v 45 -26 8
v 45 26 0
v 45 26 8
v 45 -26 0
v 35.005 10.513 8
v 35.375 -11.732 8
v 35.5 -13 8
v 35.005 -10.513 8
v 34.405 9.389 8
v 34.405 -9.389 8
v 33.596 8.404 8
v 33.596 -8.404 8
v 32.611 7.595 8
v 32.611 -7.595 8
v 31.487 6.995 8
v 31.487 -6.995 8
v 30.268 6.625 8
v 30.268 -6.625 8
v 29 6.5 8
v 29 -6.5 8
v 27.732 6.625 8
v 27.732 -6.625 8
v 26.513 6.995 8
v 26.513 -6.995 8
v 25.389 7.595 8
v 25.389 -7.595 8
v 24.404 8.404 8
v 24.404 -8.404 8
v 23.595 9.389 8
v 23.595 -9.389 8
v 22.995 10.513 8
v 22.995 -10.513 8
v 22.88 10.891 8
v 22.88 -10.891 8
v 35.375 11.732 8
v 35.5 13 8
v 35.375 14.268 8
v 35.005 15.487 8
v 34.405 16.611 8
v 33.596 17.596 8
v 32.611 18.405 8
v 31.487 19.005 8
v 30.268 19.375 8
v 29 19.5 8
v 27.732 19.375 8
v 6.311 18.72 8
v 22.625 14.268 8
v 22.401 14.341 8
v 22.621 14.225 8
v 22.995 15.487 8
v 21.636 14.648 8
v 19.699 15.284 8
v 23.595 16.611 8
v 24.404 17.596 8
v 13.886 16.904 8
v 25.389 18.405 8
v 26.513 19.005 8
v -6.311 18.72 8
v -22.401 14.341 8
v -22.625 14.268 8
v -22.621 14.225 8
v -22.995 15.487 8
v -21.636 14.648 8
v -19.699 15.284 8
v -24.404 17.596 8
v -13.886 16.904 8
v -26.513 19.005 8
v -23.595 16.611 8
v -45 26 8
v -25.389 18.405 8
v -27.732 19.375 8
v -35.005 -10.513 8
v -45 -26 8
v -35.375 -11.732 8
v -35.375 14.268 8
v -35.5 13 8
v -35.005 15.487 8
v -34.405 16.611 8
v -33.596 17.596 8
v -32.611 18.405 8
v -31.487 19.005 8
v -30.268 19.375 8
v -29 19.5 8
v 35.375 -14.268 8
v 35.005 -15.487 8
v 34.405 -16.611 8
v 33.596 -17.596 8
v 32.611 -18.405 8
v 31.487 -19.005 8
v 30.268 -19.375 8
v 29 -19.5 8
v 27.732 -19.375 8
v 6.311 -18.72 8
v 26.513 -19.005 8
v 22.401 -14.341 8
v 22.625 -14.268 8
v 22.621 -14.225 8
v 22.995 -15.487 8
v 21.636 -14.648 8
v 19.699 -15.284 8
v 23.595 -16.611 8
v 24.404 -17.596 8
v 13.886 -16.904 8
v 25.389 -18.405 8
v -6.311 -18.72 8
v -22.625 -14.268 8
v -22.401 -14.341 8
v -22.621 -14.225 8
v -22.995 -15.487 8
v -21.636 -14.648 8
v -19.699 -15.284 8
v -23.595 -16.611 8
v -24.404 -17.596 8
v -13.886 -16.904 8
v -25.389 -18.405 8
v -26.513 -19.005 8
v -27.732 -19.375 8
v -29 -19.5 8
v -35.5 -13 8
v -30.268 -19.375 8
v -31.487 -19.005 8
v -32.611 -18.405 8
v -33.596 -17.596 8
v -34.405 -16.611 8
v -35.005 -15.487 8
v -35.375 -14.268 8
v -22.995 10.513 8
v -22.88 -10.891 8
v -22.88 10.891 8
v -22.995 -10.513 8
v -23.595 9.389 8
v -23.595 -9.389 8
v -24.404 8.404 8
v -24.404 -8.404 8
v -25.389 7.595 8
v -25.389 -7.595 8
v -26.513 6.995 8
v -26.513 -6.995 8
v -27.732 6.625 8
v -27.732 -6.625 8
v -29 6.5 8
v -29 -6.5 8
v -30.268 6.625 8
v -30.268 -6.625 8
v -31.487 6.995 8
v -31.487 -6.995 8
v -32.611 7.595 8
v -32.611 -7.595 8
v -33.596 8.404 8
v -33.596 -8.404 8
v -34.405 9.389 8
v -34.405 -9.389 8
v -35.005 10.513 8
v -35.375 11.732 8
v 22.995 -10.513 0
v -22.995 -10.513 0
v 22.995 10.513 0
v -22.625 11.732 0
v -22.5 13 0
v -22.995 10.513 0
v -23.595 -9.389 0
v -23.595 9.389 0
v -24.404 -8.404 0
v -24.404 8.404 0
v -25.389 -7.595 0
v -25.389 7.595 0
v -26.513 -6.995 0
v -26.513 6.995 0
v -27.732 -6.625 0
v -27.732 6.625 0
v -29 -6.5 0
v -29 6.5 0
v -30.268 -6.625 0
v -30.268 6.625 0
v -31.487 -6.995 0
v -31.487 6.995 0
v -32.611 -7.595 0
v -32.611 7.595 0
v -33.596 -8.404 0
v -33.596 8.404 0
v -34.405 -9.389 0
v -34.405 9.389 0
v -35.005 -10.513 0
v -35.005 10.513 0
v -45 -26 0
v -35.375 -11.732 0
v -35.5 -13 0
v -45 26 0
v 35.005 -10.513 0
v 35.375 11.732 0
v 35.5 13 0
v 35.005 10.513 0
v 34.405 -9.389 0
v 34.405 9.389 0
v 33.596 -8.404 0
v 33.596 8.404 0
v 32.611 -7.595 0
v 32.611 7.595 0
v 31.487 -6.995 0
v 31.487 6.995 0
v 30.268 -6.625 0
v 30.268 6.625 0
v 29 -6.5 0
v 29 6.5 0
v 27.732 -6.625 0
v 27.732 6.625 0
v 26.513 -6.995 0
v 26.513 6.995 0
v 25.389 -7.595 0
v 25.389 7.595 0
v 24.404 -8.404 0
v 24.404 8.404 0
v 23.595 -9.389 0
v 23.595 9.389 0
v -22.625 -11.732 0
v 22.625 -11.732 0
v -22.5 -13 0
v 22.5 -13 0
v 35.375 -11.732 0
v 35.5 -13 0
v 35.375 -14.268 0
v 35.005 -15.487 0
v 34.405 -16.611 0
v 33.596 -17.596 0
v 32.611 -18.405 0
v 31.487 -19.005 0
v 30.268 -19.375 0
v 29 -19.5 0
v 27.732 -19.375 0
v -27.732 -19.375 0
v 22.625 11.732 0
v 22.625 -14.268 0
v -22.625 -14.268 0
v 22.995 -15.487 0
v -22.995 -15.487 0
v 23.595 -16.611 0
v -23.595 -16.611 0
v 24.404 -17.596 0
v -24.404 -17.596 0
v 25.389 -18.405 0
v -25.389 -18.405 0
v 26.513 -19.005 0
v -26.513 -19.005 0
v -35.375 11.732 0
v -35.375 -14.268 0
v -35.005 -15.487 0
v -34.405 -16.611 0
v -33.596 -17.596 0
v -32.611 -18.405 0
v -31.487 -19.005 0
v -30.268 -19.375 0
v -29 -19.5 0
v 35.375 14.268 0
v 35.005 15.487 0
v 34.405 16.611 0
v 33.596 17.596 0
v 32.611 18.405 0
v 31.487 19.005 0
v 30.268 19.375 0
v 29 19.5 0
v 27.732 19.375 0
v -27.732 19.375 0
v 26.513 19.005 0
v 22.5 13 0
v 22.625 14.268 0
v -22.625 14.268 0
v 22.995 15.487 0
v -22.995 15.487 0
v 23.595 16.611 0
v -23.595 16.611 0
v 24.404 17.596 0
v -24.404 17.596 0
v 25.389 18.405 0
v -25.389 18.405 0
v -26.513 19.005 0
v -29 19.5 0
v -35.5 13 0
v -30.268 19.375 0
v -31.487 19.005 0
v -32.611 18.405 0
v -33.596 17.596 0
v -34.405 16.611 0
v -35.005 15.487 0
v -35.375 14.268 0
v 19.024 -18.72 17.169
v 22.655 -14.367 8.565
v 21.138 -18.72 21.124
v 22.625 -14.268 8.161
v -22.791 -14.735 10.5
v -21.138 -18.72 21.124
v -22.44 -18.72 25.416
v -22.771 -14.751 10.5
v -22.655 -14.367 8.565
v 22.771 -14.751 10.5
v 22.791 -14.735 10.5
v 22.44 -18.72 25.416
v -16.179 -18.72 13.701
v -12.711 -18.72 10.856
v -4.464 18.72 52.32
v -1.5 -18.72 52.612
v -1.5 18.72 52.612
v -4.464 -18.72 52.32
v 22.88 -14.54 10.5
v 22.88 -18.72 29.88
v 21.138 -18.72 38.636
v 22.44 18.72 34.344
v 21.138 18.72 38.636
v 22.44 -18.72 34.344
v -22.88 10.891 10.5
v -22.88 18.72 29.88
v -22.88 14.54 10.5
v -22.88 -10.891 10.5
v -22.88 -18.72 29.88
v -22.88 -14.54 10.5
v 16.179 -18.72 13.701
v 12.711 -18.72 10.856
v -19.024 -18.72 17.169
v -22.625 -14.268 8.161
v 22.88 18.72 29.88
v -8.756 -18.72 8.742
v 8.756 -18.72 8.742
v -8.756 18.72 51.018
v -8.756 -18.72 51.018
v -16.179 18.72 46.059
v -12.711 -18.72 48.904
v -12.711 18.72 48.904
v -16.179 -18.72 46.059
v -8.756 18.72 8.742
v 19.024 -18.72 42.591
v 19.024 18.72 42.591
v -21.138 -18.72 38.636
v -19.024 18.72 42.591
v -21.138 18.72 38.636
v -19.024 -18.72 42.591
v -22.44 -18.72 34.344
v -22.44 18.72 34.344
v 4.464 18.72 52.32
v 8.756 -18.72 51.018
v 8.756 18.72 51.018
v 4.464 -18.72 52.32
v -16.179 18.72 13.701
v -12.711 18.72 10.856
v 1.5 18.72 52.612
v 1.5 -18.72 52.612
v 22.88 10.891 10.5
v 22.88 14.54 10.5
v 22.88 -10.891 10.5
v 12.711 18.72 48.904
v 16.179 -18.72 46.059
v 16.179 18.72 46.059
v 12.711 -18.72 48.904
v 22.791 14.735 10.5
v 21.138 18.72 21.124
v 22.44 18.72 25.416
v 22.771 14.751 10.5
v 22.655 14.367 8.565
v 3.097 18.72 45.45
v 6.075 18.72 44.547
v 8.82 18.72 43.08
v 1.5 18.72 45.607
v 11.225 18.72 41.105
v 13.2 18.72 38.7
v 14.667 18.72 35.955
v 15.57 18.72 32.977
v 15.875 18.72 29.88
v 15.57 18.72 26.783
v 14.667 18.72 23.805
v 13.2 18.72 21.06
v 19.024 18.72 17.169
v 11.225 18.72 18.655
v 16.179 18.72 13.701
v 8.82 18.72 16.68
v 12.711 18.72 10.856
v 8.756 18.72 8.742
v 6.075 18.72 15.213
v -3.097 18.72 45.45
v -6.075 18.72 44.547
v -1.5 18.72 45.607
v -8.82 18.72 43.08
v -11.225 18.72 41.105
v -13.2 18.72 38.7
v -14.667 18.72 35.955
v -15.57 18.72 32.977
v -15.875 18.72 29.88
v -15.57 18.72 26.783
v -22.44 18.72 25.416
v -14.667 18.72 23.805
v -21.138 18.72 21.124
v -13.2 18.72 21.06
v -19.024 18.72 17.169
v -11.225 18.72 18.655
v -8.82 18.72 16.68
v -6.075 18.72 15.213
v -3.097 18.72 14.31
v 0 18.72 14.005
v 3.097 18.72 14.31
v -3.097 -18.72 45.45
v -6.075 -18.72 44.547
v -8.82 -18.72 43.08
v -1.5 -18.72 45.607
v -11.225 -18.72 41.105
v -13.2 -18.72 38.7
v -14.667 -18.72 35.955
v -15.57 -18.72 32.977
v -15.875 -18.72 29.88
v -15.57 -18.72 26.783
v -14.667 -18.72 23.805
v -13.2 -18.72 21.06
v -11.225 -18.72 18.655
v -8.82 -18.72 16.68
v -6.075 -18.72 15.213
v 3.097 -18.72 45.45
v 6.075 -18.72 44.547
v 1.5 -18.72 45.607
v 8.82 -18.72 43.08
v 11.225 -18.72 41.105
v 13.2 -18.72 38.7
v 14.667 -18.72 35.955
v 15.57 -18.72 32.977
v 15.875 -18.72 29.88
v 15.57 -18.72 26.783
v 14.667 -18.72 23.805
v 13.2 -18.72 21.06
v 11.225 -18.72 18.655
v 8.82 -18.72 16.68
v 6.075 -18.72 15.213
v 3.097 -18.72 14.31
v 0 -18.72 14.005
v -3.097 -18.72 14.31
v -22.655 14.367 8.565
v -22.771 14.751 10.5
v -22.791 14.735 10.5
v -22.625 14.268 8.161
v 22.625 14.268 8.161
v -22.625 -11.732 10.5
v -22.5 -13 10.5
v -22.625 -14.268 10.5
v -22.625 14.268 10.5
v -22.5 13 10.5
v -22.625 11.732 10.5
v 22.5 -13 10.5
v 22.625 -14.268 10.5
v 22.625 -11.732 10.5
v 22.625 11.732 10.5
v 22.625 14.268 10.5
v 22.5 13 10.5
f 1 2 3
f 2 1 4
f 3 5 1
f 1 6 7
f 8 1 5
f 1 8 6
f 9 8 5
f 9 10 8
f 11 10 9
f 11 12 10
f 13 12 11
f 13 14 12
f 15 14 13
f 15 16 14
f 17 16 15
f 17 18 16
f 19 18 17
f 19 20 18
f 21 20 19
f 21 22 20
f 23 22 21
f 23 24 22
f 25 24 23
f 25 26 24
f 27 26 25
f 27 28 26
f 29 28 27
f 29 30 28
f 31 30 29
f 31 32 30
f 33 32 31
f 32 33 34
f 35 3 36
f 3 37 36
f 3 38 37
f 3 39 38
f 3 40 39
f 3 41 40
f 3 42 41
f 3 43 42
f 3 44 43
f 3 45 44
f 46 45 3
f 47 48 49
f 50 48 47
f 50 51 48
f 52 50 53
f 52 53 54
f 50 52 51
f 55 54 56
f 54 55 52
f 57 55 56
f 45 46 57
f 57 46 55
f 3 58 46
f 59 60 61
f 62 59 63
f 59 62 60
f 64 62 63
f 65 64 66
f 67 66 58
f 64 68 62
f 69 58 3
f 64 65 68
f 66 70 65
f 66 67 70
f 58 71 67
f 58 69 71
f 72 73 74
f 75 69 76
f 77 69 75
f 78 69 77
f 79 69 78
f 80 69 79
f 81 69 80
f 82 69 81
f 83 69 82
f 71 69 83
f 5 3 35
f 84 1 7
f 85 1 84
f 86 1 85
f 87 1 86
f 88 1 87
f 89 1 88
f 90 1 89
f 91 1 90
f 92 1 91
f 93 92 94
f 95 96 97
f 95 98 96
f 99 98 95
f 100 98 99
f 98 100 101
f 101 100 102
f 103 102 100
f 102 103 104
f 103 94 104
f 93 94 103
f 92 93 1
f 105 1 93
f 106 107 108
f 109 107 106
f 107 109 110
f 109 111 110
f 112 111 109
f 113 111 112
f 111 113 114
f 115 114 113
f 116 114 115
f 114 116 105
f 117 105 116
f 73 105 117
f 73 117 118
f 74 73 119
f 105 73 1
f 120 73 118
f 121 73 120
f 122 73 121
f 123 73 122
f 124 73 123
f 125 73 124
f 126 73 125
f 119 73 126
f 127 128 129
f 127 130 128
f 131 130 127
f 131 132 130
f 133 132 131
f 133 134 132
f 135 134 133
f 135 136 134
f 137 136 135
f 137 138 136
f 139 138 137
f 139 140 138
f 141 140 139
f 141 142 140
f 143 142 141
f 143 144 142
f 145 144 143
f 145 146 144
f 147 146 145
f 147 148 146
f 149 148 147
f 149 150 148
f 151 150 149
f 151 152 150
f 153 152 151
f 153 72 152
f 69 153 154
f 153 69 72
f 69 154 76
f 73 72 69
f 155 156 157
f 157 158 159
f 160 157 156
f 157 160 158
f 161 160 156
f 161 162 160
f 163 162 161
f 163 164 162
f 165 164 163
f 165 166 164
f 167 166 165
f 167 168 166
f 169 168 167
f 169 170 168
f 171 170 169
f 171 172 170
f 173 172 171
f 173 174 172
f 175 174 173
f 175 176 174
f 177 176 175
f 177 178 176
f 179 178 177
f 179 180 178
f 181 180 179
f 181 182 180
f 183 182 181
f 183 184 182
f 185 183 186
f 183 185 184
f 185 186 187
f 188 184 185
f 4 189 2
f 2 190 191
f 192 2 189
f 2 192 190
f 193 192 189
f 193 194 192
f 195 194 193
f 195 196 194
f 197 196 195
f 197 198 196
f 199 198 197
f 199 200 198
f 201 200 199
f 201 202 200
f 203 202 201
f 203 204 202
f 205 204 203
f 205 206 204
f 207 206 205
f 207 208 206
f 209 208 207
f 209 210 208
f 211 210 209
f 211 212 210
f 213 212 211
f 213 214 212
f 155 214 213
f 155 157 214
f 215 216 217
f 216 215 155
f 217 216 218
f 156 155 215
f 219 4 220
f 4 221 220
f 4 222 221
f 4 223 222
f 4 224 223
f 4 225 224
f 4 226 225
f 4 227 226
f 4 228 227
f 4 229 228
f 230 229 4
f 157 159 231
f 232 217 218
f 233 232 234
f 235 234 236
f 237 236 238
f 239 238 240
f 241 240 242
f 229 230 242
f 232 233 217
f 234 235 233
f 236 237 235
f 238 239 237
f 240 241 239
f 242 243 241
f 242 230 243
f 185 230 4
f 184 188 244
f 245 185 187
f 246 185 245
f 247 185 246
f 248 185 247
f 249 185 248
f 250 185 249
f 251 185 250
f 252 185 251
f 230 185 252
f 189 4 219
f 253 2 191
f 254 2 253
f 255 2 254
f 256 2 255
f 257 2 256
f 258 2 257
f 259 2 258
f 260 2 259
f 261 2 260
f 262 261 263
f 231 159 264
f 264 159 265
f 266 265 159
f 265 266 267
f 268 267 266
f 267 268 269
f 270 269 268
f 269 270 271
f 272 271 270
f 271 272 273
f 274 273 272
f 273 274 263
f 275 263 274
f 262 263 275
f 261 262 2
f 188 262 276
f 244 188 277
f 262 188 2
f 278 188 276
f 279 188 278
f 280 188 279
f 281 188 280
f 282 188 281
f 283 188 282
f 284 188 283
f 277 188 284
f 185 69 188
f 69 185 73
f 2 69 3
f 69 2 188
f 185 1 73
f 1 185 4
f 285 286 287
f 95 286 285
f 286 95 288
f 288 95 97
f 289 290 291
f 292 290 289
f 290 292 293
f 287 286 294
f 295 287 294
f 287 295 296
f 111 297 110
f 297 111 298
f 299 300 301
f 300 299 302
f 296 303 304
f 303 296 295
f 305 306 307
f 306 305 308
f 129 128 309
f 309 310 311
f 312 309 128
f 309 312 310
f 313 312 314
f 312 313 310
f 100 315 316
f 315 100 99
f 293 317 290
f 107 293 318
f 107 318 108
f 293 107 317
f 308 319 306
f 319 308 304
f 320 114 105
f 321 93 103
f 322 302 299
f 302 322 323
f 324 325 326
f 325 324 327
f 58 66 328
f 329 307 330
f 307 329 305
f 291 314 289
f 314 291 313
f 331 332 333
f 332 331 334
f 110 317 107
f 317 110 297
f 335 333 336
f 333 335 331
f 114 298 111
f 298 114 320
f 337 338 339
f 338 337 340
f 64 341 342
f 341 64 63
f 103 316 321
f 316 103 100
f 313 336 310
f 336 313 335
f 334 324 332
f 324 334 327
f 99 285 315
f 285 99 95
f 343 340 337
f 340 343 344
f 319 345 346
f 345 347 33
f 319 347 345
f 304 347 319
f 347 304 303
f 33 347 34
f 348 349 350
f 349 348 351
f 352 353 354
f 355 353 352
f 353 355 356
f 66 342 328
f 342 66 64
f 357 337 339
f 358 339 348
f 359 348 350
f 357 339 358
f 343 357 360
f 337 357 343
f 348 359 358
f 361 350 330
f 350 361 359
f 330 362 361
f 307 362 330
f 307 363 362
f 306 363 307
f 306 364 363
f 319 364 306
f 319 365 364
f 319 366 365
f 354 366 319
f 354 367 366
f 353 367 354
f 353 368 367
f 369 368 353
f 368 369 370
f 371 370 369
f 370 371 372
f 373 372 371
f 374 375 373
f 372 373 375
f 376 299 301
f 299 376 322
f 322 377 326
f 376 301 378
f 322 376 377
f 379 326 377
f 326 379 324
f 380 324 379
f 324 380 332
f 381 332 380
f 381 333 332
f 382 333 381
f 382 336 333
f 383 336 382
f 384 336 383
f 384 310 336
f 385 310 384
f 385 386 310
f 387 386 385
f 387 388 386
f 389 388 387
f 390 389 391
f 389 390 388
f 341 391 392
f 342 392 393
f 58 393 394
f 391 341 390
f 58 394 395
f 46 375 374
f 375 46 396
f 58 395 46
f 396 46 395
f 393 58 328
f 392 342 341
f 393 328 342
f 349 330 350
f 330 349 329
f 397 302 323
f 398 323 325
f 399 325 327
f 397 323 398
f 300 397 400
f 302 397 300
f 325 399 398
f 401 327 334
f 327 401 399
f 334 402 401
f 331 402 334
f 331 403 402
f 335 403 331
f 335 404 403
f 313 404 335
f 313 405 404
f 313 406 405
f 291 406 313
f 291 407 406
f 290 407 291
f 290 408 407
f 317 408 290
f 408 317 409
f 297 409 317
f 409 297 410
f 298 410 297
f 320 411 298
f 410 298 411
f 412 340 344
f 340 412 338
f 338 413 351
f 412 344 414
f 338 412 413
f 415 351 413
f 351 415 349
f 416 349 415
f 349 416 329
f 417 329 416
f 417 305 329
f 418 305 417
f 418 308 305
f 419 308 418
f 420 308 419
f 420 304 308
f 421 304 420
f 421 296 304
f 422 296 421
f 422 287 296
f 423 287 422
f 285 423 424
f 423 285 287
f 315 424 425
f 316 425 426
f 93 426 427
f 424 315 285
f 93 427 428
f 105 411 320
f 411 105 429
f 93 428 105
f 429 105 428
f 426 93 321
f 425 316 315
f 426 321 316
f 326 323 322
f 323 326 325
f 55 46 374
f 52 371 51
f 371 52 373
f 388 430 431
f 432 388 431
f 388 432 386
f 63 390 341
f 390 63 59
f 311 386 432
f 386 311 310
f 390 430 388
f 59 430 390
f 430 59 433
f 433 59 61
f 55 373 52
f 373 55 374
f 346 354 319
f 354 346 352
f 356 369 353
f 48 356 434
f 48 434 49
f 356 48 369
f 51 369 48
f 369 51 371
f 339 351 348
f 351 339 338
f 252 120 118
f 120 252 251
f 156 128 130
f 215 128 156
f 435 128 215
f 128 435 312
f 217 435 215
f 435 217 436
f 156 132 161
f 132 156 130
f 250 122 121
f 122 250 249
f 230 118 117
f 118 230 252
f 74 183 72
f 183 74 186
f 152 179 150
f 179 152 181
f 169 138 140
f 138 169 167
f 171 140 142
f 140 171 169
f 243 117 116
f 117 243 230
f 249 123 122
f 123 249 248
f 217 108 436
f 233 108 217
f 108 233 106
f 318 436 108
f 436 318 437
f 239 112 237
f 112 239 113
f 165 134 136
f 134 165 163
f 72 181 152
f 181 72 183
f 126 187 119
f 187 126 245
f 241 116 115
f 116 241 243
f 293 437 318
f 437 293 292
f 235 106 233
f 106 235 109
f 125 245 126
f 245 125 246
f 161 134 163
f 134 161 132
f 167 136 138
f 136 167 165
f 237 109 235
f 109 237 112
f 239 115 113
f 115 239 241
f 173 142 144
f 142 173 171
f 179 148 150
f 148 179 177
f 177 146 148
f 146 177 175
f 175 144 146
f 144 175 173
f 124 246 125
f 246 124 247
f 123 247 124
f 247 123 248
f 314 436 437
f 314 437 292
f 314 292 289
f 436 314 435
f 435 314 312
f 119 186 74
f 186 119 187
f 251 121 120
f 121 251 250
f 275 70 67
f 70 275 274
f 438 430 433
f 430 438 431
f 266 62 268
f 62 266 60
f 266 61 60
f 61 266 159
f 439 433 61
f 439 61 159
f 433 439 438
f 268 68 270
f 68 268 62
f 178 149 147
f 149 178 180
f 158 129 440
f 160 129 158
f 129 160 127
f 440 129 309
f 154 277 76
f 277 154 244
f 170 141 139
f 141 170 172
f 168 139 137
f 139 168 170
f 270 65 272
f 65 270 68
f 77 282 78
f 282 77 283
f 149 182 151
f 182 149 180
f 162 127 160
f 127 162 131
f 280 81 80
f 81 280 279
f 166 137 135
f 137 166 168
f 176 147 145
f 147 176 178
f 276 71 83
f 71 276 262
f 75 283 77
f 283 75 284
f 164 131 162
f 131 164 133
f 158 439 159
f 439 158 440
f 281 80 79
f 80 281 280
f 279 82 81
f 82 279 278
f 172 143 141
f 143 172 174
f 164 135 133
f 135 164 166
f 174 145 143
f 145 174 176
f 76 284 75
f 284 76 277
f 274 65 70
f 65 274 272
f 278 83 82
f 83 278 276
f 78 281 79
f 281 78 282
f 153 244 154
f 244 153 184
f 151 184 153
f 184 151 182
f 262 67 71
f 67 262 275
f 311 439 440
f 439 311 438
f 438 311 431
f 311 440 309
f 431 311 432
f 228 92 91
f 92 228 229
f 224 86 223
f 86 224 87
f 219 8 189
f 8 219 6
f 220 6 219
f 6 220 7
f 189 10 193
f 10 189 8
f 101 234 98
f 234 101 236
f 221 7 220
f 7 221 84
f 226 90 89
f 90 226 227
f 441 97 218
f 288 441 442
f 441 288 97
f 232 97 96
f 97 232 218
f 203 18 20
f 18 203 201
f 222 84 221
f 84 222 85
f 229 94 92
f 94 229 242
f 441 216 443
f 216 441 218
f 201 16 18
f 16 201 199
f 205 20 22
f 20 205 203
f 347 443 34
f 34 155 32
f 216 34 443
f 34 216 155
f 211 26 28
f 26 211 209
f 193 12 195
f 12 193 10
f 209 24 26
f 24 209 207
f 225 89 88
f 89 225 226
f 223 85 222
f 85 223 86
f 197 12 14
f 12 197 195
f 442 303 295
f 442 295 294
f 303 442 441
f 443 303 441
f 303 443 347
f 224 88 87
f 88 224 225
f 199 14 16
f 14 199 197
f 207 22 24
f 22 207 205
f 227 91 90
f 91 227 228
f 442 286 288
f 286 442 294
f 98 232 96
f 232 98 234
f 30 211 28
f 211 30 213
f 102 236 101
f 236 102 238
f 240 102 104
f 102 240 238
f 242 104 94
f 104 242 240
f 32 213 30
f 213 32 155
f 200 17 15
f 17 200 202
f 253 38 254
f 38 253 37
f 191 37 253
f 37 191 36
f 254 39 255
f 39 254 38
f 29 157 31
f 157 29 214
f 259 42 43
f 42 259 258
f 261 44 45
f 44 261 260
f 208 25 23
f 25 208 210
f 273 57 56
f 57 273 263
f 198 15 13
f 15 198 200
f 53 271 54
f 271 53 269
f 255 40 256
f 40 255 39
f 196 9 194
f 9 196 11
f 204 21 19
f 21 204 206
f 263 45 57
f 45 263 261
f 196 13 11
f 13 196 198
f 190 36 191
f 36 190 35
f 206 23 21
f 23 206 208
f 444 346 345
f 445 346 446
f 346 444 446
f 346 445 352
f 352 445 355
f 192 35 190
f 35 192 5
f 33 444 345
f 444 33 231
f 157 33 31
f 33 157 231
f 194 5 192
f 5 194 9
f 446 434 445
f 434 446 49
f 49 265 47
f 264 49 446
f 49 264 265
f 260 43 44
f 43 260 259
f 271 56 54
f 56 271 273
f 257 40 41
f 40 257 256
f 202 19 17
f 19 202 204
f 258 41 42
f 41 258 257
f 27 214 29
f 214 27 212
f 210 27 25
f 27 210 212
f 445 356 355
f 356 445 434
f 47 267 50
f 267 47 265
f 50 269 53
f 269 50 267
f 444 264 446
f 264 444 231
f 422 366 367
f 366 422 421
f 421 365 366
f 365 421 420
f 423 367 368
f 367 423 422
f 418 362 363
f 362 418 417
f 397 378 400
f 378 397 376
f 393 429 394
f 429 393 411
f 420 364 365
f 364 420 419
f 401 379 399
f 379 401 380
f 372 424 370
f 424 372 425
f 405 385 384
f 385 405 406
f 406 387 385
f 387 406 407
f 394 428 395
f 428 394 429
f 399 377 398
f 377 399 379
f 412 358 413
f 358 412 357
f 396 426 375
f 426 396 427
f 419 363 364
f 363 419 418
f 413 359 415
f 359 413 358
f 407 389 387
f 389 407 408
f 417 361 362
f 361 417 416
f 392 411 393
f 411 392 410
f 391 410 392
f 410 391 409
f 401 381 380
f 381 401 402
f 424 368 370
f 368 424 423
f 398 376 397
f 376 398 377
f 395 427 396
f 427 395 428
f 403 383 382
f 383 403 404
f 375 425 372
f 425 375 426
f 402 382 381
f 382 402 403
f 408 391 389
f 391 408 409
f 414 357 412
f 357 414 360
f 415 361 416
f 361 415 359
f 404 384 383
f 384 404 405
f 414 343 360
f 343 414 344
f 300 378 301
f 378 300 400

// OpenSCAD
$fn = 32;

// ----------------------------------------------------------------------
// Bearing block: 90 x 52 mm base, 31.75 mm bore at 29.88 mm
// ----------------------------------------------------------------------

// --- parameters (mm) ---
base_w = 90;              // base width
base_d = 52;              // base depth
base_t = 8;               // base thickness
bore_d = 31.75;           // shaft / bearing bore
house_r = 22.88;          // housing outer radius
house_len = 37.44;        // housing length along the shaft
foot_w = 45.76;           // foot width under the housing
foot_len = 27.44;         // foot length along the shaft
axis_z = 29.88;           // bore axis height above the base
holes_d = 13;             // mounting holes
hole_x = 29;              // mounting hole spacing
groove_w = 3;             // oil groove width

difference() {
  union() {
    /* base plate with its underside on z = 0 */
    translate([0, 0, base_t / 2]) cube([base_w, base_d, base_t], center = true);
    /* hull foot: a straight web blending into the round housing */
    hull() {
      translate([0, 0, base_t - 0.5]) cube([foot_w, foot_len, 1.6], center = true);
      translate([0, 0, axis_z]) rotate([-90, 0, 0]) cylinder(h = house_len, d = 2 * house_r, center = true);
    }
  }
  /* bore through the housing, 2.5 mm clear on both sides */
  translate([0, 0, axis_z]) rotate([-90, 0, 0]) cylinder(h = house_len + 5, d = bore_d, center = true);
  /* oil groove from the top of the housing into the bore */
  translate([-groove_w / 2, -house_len / 2 - 2.5, axis_z + bore_d * 0.17]) cube([groove_w, house_len + 5, house_r + 5]);
  /* mounting holes through the base plate */
  for (hx = [-29, 29]) {
    for (hy = [-13, 13]) {
      translate([hx, hy, -2.5]) cylinder(h = base_t + 5, d = holes_d);
    }
  }
}
